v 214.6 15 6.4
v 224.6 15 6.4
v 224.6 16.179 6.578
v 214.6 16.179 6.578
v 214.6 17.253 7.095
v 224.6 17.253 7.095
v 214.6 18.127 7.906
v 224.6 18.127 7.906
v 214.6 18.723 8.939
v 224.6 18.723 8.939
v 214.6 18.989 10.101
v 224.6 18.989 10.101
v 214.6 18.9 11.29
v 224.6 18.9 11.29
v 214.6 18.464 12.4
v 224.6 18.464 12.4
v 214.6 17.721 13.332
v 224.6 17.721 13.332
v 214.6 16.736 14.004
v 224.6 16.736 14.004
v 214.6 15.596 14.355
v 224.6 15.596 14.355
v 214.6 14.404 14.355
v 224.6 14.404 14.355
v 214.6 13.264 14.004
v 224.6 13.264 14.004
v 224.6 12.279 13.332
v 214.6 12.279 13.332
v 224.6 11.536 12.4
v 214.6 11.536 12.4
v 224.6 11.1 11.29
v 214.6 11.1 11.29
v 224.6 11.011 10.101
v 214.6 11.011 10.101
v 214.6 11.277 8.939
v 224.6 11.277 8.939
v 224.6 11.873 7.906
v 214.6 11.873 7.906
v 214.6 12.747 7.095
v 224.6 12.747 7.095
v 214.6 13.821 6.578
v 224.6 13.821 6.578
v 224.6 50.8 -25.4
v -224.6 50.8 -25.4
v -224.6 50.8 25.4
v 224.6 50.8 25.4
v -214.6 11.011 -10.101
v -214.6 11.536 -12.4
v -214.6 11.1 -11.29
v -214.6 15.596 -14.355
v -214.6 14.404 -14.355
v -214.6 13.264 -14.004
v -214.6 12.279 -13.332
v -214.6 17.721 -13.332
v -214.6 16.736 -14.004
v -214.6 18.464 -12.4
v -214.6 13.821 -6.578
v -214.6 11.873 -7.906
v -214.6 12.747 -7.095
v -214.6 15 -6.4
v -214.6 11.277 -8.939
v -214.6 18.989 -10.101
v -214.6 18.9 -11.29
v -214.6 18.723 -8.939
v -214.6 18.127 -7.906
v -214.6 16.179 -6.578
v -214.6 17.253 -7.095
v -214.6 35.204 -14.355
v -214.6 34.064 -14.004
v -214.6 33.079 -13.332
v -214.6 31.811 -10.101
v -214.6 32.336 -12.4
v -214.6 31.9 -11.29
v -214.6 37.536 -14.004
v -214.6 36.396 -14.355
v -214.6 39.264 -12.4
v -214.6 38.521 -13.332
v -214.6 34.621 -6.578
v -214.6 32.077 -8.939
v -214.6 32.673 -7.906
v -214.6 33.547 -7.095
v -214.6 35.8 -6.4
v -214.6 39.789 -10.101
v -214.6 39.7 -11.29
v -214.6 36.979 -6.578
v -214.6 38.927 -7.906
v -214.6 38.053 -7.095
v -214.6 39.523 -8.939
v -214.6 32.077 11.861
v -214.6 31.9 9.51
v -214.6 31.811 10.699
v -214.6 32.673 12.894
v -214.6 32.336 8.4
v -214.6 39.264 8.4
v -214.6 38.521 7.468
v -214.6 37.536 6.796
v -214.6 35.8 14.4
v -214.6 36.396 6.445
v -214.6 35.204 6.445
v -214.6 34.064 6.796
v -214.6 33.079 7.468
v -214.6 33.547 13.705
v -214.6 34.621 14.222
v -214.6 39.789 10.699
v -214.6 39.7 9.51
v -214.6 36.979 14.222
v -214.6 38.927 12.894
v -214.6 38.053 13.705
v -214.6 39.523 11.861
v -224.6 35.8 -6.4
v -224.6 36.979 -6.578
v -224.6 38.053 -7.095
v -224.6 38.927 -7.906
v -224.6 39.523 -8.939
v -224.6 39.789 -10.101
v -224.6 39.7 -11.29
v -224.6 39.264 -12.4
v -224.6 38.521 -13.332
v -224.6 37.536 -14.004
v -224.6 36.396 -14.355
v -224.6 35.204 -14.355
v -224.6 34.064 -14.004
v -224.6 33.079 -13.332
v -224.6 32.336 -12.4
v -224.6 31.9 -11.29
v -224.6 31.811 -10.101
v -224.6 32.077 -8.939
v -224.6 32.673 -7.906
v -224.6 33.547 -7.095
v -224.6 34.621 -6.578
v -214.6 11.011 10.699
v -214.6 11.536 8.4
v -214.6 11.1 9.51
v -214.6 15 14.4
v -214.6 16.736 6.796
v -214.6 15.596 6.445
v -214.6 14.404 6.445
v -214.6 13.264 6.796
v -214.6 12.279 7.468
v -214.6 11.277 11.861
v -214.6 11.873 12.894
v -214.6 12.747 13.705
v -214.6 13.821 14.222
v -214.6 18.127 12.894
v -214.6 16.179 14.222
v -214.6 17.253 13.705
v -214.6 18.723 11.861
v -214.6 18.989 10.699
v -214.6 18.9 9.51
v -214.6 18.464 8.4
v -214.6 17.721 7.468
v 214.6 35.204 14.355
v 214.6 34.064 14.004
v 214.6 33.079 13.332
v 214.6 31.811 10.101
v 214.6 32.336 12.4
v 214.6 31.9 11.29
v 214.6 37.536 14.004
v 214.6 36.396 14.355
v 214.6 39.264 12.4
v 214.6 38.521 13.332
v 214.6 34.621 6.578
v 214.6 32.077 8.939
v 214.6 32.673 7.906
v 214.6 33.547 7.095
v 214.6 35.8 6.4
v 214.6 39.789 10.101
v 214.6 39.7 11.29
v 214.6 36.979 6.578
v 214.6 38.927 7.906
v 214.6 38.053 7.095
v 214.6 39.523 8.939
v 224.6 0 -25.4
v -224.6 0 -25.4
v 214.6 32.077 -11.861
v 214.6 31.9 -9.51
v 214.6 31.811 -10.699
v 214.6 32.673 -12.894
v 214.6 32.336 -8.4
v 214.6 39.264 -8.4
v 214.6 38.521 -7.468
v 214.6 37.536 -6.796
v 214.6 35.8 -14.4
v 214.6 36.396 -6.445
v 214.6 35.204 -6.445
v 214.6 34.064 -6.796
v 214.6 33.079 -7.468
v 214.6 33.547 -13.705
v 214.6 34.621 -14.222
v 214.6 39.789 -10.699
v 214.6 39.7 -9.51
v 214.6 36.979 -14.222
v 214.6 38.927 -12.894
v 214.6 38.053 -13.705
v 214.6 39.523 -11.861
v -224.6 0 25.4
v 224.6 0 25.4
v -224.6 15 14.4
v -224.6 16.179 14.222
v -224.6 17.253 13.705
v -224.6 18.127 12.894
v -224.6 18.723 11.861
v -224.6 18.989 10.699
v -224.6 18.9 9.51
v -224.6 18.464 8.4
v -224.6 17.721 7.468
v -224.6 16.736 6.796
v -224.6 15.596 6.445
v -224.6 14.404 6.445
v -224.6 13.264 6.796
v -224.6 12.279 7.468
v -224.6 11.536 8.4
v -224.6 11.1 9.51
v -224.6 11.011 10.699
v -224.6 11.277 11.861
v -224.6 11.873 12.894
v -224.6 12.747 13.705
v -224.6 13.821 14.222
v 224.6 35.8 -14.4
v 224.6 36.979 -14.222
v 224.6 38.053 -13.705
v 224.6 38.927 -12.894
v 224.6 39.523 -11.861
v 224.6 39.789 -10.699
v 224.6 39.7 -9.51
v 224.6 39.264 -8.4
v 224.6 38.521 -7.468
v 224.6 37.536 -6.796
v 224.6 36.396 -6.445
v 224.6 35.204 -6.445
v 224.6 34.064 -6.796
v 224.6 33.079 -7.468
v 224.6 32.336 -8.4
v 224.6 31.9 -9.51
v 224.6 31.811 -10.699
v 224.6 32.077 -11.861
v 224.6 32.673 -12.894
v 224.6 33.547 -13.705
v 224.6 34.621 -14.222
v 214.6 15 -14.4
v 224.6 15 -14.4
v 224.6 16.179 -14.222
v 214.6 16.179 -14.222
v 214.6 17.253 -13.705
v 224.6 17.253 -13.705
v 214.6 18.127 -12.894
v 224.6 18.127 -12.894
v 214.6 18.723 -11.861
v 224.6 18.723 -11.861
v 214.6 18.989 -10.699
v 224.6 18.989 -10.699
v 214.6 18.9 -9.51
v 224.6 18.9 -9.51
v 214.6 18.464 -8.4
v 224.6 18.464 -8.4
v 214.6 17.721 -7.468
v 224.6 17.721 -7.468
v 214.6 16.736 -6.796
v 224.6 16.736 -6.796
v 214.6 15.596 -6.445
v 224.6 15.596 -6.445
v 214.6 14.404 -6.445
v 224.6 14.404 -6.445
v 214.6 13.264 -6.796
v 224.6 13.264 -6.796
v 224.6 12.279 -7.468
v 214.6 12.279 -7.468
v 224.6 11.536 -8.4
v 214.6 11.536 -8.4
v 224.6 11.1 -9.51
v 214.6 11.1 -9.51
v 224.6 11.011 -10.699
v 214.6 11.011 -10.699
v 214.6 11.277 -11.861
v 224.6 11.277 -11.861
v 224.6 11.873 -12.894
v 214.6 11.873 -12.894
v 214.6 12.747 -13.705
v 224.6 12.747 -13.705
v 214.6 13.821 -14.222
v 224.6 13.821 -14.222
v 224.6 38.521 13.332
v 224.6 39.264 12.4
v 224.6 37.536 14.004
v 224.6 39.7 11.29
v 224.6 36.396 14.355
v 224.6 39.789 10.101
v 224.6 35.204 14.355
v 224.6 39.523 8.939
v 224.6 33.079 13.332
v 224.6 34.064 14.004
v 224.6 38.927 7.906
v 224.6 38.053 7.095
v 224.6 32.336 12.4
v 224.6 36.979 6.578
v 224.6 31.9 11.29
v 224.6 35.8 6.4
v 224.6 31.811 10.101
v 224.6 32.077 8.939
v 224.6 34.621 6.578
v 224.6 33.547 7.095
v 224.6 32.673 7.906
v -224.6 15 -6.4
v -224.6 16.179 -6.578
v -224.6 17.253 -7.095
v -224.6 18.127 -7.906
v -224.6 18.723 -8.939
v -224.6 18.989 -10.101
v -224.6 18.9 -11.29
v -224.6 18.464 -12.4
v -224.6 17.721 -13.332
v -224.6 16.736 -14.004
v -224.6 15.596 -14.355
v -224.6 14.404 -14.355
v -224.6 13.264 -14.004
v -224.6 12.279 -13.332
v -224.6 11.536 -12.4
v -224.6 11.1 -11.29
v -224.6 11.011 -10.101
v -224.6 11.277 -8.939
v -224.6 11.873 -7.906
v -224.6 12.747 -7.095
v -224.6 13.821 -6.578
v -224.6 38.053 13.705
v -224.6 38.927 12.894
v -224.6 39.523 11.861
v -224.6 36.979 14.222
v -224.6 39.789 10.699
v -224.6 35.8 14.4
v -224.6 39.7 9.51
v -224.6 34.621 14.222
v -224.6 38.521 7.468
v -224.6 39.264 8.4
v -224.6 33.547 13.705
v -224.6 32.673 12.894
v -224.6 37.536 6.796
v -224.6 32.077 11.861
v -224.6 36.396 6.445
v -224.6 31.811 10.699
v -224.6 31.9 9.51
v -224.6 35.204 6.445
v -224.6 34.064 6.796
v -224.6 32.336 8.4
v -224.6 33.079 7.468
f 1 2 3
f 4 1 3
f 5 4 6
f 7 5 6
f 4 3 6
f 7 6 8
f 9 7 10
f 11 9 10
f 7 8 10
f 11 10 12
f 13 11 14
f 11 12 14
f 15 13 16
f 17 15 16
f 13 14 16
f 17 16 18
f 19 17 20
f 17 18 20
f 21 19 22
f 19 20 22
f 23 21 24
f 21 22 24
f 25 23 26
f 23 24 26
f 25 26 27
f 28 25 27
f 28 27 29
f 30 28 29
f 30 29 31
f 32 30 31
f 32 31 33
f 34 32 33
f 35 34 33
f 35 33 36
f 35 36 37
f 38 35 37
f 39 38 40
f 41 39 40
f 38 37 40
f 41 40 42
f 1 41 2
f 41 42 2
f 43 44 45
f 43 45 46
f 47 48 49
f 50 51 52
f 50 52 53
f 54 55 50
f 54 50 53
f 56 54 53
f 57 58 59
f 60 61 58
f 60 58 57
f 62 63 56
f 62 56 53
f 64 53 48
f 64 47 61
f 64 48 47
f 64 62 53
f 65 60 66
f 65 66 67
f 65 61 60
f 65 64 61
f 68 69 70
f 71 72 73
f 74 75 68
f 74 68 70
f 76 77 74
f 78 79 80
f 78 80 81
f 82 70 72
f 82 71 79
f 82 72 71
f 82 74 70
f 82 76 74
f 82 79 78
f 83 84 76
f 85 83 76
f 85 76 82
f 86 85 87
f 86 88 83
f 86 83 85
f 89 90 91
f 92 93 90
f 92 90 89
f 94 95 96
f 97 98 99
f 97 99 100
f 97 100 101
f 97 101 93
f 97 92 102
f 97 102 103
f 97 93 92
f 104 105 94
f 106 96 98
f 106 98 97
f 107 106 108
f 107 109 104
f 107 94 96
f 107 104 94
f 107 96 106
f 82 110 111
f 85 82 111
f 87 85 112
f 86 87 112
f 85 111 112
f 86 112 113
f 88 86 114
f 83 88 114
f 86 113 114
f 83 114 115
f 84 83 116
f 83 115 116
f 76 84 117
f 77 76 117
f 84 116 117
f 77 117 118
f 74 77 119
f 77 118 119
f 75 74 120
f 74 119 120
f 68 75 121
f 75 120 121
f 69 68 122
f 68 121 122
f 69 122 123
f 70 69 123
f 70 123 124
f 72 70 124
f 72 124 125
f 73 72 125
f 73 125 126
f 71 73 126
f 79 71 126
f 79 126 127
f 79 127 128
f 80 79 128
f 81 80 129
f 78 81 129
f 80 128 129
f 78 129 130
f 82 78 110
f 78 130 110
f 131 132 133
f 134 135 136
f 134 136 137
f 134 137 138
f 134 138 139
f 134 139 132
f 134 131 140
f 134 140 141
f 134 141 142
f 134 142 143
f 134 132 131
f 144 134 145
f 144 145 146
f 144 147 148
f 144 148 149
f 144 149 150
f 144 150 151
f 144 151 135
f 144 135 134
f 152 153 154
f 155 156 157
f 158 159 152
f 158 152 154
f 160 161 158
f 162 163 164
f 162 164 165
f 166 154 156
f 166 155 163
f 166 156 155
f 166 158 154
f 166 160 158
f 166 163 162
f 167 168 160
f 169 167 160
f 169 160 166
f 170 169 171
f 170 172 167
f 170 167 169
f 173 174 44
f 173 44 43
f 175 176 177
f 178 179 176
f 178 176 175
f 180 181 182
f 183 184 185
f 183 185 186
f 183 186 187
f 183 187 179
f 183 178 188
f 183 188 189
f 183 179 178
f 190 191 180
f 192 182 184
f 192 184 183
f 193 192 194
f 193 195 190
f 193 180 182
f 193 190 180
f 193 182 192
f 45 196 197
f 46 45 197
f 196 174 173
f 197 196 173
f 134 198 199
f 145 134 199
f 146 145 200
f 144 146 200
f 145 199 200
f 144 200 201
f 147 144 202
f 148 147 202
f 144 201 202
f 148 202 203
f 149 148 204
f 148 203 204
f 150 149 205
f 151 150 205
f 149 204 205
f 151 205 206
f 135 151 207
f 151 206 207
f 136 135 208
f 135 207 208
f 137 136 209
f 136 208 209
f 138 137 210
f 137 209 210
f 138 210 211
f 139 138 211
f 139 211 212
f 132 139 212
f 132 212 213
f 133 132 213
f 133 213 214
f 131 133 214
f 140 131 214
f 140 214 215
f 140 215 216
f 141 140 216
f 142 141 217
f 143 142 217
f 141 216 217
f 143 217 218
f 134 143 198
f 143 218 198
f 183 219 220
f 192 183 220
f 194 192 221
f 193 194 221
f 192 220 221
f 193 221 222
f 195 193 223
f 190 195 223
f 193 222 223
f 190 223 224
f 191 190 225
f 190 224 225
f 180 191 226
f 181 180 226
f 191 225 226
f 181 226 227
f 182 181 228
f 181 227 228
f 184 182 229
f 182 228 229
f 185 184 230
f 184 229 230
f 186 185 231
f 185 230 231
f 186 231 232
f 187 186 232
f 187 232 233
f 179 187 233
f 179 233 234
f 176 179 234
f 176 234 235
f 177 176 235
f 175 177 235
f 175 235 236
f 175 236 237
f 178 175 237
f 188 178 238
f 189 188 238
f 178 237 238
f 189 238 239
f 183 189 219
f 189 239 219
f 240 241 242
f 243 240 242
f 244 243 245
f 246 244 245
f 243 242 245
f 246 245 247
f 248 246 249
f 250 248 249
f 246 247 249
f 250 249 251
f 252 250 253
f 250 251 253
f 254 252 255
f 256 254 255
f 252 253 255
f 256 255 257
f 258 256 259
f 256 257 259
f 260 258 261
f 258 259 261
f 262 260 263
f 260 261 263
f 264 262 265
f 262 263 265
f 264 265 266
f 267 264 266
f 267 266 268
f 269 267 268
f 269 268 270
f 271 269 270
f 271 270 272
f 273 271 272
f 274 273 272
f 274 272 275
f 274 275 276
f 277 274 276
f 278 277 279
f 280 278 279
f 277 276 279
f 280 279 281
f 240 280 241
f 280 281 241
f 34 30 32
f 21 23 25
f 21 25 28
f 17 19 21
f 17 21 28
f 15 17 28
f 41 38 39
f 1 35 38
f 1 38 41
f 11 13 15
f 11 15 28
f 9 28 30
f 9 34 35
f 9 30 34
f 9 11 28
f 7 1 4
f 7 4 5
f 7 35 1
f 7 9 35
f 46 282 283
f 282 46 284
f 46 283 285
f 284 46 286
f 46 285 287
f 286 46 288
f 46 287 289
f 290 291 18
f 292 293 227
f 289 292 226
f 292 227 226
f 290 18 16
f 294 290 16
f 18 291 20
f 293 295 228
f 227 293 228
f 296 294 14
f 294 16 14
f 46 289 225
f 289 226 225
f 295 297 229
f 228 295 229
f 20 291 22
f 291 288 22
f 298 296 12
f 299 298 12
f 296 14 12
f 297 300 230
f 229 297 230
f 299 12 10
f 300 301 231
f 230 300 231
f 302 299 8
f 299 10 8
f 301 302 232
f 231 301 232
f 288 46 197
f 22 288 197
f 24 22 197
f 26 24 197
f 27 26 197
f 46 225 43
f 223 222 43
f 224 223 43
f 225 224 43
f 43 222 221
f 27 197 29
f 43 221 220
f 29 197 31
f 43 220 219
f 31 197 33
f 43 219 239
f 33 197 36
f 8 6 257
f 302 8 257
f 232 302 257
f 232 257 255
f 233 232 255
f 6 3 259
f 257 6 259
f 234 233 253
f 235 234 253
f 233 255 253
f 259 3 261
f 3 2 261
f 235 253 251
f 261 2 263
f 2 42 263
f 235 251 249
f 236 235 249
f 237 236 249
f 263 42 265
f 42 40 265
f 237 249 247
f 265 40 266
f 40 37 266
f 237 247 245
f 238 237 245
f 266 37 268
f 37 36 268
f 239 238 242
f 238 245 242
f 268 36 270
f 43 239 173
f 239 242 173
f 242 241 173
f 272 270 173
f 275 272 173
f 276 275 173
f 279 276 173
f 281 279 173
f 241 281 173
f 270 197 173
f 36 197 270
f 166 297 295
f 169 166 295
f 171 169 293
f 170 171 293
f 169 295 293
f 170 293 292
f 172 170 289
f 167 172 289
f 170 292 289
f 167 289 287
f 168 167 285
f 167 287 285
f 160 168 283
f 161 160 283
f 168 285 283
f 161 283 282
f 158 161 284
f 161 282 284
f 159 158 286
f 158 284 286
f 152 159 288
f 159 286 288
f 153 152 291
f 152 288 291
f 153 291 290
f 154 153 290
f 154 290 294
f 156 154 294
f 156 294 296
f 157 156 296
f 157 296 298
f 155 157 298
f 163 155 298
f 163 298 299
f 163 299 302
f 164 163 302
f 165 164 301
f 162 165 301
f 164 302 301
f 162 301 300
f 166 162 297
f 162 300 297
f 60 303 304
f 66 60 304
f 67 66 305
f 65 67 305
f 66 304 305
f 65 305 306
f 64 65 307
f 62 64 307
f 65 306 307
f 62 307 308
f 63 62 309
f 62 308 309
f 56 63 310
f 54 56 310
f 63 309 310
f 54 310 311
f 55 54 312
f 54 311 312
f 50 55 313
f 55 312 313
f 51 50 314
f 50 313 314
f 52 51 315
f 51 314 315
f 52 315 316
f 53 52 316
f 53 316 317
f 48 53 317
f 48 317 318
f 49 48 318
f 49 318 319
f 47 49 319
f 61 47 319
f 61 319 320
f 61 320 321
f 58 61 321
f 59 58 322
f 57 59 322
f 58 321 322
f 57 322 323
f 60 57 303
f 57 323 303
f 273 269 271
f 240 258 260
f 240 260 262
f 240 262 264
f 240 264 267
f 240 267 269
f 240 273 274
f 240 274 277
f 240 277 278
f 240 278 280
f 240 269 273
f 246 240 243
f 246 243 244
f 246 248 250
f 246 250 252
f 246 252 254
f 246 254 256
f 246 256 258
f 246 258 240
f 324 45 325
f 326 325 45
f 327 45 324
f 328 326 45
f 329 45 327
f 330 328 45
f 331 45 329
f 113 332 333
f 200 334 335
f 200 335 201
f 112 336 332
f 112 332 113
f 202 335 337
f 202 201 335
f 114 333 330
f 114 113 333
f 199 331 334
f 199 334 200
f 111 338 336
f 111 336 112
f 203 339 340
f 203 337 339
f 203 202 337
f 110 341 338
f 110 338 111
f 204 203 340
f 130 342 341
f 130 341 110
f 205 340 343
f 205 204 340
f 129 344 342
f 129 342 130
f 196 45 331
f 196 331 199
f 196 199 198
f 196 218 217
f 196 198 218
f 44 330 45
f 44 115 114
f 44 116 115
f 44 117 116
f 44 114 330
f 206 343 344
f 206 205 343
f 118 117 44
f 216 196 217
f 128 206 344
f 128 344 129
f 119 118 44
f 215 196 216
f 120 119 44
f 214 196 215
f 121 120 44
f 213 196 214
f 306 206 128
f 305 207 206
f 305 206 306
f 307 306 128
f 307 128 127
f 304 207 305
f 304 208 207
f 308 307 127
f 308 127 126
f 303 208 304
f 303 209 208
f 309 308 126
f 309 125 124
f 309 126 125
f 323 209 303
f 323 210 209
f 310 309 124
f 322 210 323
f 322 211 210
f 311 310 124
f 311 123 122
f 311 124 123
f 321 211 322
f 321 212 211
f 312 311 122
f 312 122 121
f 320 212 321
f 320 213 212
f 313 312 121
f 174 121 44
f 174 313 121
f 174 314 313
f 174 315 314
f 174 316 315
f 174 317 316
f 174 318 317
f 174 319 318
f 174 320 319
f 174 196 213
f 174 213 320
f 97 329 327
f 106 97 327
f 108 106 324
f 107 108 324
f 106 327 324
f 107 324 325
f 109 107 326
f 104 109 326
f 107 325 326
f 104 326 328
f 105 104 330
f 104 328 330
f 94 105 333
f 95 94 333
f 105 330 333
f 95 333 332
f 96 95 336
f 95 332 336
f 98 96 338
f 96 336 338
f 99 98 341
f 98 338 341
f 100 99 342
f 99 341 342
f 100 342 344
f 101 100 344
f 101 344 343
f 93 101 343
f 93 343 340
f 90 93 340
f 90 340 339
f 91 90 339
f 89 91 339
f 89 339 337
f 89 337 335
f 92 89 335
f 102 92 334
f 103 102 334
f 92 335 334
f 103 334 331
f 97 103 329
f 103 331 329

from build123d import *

# Parameters (mm, degrees)
CROQUIS1_W              = 449.2
CROQUIS1_H              = 50.8
SALIENTE_EXTRUIR1_DEPTH = 50.8
CROQUIS2_R              = 4
CORTAR_EXTRUIR1_DEPTH   = 10
CROQUIS3_R              = 4
CORTAR_EXTRUIR2_DEPTH   = 10


with BuildPart() as part:
    # Croquis1 → Saliente-Extruir1 (new body)
    with BuildSketch(Plane(origin=(0, 0, 0), x_dir=(1, 0, 0), z_dir=(0, 1, 0))):
        Rectangle(CROQUIS1_W, CROQUIS1_H)
    extrude(amount=SALIENTE_EXTRUIR1_DEPTH)

    # Croquis2 → Cortar-Extruir1 (cut)
    with BuildSketch(Plane(origin=(224.6, 0, 0), x_dir=(0, 0, -1), z_dir=(1, 0, 0))):
        with Locations((-10.4, 35.8)):
            Circle(CROQUIS2_R)
        with Locations((10.4, 35.8)):
            Circle(CROQUIS2_R)
        with Locations((10.4, 15)):
            Circle(CROQUIS2_R)
        with Locations((-10.4, 15)):
            Circle(CROQUIS2_R)
    extrude(amount=-CORTAR_EXTRUIR1_DEPTH, mode=Mode.SUBTRACT)

    # Croquis3 → Cortar-Extruir2 (cut)
    with BuildSketch(Plane.ZY.offset(224.6)):
        with Locations((10.4, 35.8)):
            Circle(CROQUIS3_R)
        with Locations((-10.4, 35.8)):
            Circle(CROQUIS3_R)
        with Locations((-10.4, 15)):
            Circle(CROQUIS3_R)
        with Locations((10.4, 15)):
            Circle(CROQUIS3_R)
    extrude(amount=-CORTAR_EXTRUIR2_DEPTH, mode=Mode.SUBTRACT)


solid = part.part
